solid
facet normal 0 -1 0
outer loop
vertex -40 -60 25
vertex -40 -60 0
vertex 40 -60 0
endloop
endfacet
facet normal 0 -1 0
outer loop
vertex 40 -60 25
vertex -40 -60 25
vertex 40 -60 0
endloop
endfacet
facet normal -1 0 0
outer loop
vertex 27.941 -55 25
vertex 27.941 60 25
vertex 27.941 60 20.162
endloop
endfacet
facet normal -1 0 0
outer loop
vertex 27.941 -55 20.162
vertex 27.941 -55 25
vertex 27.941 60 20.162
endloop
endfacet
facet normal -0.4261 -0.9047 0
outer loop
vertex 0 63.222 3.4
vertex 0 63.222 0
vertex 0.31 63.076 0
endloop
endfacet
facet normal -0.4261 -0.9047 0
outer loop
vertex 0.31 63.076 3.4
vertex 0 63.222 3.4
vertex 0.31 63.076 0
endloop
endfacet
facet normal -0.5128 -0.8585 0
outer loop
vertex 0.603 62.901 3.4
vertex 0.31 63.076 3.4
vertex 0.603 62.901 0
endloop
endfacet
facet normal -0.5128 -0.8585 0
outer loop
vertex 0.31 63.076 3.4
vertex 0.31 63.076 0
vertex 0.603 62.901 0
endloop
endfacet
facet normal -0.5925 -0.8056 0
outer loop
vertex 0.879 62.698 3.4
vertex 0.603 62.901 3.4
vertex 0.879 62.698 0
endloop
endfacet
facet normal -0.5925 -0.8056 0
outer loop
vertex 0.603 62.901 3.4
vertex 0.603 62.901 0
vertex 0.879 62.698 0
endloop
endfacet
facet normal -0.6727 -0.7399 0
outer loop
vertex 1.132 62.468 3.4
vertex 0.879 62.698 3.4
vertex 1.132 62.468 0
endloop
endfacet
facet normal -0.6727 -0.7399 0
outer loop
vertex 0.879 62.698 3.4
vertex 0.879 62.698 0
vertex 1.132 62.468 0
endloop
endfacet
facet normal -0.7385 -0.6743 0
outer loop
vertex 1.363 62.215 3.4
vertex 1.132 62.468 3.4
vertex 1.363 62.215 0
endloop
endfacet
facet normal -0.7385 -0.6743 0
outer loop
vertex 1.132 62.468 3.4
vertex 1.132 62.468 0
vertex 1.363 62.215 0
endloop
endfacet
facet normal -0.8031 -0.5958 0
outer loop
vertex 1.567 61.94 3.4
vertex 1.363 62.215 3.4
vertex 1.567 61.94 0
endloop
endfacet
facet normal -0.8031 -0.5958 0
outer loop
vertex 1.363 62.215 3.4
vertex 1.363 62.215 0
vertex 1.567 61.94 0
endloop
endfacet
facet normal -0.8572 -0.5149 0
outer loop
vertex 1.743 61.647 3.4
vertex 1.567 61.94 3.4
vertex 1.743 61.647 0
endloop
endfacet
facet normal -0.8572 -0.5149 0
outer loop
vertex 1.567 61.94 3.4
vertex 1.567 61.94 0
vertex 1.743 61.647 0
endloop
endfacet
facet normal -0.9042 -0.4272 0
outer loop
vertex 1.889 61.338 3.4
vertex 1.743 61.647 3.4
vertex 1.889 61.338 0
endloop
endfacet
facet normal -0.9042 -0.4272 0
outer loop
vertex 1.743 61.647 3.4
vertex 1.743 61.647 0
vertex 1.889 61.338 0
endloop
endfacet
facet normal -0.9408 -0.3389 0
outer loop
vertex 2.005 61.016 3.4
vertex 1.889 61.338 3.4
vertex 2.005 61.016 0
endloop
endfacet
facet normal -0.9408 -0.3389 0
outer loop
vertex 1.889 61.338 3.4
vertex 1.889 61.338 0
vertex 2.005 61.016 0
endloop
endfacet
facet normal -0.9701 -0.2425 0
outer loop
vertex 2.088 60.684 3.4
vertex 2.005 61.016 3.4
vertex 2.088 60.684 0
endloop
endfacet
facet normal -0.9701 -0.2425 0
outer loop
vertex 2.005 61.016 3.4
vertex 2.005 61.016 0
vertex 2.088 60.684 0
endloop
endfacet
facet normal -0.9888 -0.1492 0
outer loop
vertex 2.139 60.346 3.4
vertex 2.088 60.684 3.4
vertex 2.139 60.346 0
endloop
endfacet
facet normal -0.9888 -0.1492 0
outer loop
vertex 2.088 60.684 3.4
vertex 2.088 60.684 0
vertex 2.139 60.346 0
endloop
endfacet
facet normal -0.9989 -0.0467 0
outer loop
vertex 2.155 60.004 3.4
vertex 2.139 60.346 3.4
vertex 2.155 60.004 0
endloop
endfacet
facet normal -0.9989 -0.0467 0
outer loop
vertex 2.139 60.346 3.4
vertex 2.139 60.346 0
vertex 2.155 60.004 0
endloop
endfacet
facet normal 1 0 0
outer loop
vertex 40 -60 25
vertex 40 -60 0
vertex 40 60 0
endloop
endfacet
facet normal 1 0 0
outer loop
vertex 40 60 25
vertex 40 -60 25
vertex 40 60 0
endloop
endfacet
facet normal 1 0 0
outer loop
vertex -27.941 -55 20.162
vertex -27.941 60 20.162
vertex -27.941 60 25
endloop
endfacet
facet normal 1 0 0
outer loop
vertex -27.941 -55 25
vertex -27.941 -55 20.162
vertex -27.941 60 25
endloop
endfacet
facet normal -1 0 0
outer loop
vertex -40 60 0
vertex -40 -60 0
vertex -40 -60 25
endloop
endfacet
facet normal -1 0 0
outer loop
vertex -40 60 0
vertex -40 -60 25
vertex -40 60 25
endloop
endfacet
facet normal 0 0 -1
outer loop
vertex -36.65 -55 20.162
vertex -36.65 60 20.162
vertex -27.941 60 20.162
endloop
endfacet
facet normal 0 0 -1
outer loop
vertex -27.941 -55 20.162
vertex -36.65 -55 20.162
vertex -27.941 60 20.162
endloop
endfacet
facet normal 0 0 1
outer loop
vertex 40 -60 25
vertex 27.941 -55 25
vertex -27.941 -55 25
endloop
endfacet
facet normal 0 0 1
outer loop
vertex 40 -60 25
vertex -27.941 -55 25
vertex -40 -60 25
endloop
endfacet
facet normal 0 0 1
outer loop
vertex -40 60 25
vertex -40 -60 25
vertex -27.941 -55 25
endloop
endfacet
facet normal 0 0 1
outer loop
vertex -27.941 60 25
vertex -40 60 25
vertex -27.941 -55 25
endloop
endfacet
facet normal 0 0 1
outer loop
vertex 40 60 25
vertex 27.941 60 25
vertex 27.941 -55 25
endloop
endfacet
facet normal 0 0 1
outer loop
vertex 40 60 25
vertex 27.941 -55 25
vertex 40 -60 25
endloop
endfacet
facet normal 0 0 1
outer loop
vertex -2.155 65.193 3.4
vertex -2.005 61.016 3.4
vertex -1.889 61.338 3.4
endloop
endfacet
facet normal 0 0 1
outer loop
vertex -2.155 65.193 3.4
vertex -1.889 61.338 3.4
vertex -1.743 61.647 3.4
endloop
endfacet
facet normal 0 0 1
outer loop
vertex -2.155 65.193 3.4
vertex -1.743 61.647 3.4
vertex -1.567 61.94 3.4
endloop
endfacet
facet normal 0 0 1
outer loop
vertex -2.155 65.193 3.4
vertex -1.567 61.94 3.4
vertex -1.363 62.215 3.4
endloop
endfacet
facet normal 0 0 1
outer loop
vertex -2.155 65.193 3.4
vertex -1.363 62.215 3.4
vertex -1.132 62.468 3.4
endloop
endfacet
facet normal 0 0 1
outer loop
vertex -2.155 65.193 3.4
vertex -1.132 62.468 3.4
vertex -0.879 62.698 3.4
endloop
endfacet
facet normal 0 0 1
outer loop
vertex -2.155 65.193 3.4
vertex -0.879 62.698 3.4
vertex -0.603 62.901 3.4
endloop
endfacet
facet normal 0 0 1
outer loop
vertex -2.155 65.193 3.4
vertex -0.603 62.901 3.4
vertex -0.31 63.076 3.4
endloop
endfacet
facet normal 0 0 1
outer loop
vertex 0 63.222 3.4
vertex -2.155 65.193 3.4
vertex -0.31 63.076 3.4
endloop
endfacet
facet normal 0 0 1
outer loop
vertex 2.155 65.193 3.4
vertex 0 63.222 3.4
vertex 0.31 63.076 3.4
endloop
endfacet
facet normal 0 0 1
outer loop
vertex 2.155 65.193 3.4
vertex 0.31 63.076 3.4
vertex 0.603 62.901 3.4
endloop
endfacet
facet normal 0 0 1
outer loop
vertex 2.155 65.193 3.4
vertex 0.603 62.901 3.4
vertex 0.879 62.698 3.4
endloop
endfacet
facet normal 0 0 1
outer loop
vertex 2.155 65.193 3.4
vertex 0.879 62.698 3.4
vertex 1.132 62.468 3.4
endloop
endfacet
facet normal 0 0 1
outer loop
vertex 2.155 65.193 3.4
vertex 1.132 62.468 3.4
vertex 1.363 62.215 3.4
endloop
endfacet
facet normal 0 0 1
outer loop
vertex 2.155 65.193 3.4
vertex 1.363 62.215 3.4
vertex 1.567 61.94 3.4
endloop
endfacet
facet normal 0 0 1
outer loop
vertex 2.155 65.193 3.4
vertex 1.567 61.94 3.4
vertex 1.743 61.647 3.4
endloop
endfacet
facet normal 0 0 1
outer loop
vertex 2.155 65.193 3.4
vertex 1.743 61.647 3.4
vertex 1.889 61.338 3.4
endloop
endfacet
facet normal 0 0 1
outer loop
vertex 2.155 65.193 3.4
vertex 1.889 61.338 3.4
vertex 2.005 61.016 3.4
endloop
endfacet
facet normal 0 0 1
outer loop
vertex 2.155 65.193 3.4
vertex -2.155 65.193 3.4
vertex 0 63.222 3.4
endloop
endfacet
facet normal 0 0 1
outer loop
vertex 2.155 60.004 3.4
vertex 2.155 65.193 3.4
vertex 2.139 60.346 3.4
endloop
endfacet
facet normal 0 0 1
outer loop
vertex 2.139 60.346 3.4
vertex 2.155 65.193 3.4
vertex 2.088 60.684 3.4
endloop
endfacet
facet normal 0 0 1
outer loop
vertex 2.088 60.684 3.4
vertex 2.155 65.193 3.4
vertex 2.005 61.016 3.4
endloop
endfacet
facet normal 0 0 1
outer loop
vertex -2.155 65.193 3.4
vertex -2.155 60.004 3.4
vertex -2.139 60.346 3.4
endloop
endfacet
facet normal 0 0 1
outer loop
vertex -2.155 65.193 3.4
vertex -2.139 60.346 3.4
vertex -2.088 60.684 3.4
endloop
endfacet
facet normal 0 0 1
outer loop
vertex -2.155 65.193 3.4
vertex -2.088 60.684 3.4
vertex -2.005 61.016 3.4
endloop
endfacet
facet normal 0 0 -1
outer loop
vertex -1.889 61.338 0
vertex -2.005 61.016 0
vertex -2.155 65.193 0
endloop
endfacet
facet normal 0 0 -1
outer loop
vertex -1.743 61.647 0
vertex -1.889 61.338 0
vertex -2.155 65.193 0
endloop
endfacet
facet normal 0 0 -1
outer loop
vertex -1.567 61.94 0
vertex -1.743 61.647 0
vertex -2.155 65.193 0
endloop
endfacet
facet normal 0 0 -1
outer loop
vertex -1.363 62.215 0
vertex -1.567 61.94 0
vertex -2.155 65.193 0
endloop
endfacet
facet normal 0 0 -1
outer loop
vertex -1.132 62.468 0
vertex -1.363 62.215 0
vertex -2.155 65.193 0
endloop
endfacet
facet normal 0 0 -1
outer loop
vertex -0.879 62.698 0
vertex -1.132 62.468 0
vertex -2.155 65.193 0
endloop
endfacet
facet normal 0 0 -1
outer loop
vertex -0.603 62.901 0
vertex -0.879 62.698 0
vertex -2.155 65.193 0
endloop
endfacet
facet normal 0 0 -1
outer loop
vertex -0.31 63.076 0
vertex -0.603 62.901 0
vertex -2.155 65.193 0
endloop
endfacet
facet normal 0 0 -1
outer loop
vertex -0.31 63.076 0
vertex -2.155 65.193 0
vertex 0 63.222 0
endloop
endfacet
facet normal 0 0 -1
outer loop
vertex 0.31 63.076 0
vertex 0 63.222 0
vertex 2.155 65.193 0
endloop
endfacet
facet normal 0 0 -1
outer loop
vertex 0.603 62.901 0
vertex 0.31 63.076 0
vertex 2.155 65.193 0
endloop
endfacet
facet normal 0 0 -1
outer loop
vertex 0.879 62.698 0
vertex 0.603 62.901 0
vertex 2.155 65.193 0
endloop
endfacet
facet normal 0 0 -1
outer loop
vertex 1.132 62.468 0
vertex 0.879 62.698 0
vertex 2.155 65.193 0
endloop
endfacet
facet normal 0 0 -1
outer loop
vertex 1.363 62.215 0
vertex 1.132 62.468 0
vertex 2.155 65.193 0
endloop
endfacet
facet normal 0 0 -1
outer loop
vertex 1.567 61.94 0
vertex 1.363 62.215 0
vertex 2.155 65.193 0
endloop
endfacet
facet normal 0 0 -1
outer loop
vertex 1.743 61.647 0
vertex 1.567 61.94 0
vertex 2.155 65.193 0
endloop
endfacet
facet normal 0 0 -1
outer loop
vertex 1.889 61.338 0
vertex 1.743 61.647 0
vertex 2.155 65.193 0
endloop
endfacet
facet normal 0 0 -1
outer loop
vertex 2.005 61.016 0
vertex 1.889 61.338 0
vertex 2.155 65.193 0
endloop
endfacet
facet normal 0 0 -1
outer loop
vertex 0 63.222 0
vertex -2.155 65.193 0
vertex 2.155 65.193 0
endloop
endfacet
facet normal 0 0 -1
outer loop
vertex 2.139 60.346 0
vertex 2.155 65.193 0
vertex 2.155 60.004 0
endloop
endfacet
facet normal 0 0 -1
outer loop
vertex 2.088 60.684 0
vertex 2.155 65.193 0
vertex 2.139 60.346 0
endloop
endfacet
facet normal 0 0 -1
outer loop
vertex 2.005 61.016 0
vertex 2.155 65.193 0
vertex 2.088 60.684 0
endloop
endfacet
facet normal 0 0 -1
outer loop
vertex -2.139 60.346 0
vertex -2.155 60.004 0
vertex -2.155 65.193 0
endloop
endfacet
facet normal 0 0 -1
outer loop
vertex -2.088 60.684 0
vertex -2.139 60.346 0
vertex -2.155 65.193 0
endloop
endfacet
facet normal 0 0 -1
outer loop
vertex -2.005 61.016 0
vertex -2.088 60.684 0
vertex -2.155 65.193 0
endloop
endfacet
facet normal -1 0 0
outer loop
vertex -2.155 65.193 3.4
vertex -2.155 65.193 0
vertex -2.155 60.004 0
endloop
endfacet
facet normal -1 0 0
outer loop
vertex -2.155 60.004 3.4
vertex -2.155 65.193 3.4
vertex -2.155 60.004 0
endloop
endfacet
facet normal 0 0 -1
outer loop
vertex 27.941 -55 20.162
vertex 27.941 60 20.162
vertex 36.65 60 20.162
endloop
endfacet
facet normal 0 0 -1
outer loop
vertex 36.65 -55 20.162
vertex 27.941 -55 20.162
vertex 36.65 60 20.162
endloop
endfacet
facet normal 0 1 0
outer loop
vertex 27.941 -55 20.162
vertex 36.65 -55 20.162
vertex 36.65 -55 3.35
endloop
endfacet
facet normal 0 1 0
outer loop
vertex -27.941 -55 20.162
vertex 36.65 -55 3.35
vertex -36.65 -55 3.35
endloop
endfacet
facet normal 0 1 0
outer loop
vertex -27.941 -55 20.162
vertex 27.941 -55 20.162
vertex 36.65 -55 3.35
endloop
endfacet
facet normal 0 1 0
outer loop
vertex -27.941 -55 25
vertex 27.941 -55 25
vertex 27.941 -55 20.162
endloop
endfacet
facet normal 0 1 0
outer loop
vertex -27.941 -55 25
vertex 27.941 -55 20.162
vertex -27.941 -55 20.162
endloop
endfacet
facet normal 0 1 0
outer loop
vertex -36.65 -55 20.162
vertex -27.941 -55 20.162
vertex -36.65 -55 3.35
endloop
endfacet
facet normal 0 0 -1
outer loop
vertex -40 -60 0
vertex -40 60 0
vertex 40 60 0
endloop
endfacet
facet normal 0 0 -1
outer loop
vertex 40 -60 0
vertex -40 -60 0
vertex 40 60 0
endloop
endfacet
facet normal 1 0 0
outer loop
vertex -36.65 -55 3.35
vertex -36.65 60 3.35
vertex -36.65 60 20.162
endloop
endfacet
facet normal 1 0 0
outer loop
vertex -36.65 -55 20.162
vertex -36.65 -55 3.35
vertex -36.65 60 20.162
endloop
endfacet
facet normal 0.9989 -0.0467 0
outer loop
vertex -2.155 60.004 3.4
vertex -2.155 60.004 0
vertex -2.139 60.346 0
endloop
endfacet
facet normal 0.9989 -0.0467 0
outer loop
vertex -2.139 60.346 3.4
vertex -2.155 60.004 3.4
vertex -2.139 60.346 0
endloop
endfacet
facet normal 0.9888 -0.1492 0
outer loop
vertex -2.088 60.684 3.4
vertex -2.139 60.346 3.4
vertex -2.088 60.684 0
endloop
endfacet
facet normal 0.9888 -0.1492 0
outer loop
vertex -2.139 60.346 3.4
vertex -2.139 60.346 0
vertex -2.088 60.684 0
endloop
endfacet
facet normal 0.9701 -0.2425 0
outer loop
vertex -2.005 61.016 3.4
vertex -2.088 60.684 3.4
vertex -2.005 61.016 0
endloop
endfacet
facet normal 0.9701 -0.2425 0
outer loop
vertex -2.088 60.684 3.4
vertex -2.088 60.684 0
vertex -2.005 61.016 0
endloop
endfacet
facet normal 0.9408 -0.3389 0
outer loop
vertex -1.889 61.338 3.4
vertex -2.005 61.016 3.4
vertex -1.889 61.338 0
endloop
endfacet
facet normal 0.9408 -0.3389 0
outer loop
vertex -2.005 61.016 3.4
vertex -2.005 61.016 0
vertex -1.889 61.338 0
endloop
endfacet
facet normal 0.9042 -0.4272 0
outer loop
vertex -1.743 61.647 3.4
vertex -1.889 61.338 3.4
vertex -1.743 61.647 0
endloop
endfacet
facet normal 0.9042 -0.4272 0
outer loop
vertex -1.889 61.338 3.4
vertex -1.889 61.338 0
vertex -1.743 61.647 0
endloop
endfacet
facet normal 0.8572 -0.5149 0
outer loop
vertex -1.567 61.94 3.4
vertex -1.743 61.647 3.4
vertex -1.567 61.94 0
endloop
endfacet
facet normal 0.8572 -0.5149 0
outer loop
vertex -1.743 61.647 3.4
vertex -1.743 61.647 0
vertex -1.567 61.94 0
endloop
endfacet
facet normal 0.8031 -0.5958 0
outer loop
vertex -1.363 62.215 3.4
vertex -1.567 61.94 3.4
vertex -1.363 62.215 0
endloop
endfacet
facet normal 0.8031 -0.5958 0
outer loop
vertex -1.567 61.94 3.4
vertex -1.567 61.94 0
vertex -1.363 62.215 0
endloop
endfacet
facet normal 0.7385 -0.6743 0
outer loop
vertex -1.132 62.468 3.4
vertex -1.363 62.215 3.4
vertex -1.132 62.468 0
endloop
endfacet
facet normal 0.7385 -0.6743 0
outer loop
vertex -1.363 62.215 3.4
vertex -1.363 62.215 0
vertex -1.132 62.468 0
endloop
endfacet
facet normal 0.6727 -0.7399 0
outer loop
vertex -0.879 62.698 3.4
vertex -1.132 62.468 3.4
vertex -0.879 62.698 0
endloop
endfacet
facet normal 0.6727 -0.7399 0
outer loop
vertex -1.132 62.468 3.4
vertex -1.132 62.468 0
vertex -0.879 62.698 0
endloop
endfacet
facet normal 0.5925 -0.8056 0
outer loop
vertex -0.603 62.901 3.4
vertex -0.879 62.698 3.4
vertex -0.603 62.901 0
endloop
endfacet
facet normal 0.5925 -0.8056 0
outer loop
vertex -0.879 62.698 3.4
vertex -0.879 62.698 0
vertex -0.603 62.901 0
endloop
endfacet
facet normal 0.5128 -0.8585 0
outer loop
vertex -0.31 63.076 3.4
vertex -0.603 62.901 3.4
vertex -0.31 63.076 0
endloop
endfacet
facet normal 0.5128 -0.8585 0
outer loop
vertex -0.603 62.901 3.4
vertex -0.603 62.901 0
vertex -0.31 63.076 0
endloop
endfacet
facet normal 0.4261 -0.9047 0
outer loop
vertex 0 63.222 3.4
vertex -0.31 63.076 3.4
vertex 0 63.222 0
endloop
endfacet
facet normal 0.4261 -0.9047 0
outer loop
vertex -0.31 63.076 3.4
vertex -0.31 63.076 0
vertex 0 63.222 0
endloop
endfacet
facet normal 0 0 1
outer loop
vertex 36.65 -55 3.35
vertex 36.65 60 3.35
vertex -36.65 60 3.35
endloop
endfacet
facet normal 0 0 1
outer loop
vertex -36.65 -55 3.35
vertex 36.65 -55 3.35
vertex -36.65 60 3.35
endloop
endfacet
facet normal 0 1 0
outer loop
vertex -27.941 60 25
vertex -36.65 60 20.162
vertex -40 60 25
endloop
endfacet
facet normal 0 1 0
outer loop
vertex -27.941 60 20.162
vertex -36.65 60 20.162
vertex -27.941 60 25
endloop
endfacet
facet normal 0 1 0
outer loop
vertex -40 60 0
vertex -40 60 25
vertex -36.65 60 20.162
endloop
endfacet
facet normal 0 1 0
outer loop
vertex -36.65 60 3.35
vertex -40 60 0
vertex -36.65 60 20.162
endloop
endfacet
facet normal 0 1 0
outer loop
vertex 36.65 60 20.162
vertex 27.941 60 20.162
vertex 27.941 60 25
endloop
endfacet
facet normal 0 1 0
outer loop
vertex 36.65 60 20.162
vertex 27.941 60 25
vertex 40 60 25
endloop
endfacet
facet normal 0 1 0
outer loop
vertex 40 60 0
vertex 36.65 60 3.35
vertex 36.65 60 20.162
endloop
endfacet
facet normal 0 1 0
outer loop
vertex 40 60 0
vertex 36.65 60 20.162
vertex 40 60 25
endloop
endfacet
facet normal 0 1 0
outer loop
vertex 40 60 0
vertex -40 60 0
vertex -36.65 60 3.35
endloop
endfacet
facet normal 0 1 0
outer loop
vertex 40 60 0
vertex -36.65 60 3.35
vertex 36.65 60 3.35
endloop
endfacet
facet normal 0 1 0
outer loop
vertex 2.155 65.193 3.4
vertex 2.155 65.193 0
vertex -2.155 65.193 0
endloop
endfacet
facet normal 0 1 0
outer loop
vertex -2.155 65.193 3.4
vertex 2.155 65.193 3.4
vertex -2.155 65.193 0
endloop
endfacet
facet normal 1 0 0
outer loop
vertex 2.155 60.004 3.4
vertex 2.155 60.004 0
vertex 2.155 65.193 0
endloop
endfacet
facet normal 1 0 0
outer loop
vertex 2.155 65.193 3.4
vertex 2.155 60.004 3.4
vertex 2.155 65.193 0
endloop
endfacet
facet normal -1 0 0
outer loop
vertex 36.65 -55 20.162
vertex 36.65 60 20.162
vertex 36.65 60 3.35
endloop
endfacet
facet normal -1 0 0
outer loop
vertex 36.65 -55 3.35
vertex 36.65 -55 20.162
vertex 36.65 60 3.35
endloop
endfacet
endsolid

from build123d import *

# Parameters (mm, degrees)
F0_W     = 80
F0_H     = 120
F1_DEPTH = 25
F3_DEPTH = 115
F5_DEPTH = 3.4


with BuildPart() as f1:
    # F0 (on Top) → F1 (new body)
    with BuildSketch(Plane.XY):
        Rectangle(F0_W, F0_H)
    extrude(amount=F1_DEPTH)

    # F2 (on face) → F3 (cut)
    with BuildSketch(Plane(origin=(0, 60, 0), x_dir=(-1, 0, 0), z_dir=(0, 1, 0))):
        Polygon((0, 3.35), (36.65, 3.35), (36.65, 20.161638), (27.940527, 20.161638), (27.940527, 25), (0, 25), (-27.940527, 25), (-27.940527, 20.161638), (-36.65, 20.161638), (-36.65, 3.35), align=None)
    extrude(amount=-F3_DEPTH, mode=Mode.SUBTRACT)


with BuildPart() as f5:
    # F4 (on face) → F5 (new body)
    with BuildSketch(Plane.XY):
        with BuildLine():
            ThreePointArc((0, 63.221723), (1.566703, 61.940476), (2.155321, 60.004067))
            Line((2.155321, 60.004067), (2.155321, 65.192647))
            Line((2.155321, 65.192647), (0, 65.192647))
            Line((0, 65.192647), (-2.155321, 65.192647))
            Line((-2.155321, 65.192647), (-2.155321, 60.004067))
            ThreePointArc((-2.155321, 60.004067), (-1.566703, 61.940476), (0, 63.221723))
        make_face()
    extrude(amount=F5_DEPTH)


solid = Compound([f1.part, f5.part])
